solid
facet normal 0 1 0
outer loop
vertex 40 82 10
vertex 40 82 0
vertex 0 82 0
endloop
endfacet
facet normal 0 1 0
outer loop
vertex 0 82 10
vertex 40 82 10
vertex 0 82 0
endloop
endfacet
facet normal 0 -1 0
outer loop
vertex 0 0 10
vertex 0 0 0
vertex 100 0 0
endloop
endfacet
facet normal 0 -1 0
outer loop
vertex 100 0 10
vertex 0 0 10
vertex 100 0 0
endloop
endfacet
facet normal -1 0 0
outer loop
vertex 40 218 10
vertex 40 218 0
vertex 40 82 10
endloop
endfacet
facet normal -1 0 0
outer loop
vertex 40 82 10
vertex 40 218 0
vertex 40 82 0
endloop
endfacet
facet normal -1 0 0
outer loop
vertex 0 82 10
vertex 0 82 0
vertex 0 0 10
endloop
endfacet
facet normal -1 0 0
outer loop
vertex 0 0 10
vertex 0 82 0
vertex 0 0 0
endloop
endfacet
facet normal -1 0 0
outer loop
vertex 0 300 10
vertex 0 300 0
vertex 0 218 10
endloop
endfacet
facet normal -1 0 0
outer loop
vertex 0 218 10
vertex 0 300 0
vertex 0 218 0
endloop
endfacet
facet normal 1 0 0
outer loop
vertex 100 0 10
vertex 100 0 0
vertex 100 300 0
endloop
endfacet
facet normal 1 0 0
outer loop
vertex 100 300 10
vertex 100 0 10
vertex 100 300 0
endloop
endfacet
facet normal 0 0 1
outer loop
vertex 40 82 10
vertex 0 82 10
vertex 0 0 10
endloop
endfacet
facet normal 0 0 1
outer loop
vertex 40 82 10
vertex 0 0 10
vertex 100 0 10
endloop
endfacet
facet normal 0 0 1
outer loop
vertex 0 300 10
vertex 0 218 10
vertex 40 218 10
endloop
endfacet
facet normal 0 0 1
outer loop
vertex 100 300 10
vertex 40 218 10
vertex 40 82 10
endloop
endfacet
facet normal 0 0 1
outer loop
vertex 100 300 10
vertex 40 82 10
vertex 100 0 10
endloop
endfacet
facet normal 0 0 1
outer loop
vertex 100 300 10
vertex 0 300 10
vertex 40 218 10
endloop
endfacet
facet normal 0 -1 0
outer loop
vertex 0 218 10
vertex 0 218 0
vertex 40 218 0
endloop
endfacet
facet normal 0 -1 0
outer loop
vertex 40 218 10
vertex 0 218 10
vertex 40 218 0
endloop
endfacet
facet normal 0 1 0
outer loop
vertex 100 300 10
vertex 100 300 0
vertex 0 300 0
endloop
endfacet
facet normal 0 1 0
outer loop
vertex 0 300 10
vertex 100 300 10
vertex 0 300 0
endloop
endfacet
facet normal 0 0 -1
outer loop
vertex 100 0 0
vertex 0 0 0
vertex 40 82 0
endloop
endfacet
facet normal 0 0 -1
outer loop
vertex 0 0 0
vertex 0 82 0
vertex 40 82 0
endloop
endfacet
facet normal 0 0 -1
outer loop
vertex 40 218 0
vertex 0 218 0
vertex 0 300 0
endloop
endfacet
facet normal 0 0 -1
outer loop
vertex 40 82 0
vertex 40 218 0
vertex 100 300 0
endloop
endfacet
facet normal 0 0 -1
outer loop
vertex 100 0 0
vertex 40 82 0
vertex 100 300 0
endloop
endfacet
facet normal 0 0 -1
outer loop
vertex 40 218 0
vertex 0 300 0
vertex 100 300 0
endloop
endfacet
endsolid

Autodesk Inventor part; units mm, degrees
ref_plane "YZ Plane" through (0, 0, 0) normal (1, 0, 0) x (0, 1, 0)
ref_plane "XZ Plane" through (0, 0, 0) normal (0, 1, 0) x (-1, 0, 0)
ref_plane "XY Plane" through (0, 0, 0) normal (0, 0, 1) x (1, 0, 0)
sketch "スケッチ1" plane through (0, 0, 0) normal (0, 0, 1) x (1, 0, 0)
  line L0 (0, 0) -> (100, 0)
  line L1 (100, 0) -> (100, 300)
  line L2 (100, 300) -> (0, 300)
  line L3 (0, 300) -> (0, 0)
  line L4 (0, 218) -> (40, 218)
  line L5 (40, 218) -> (40, 82)
  line L6 (40, 82) -> (0, 82)
  line L7 (0, 82) -> (0, 218)
  point P0 (0, 150)
  point P1 (40, 150)
  point P2 (0, 82)
  dimension "d0" = 136
  dimension "d1" = 300
  dimension "d2" = 100
  dimension "d3" = 40
  dimension "d4" = 0
extrude "押し出し1" add sketch "スケッチ1" along normal blind 10 contours L3 L6 L5 L4 L2 L1 L0
properties part number "base"
